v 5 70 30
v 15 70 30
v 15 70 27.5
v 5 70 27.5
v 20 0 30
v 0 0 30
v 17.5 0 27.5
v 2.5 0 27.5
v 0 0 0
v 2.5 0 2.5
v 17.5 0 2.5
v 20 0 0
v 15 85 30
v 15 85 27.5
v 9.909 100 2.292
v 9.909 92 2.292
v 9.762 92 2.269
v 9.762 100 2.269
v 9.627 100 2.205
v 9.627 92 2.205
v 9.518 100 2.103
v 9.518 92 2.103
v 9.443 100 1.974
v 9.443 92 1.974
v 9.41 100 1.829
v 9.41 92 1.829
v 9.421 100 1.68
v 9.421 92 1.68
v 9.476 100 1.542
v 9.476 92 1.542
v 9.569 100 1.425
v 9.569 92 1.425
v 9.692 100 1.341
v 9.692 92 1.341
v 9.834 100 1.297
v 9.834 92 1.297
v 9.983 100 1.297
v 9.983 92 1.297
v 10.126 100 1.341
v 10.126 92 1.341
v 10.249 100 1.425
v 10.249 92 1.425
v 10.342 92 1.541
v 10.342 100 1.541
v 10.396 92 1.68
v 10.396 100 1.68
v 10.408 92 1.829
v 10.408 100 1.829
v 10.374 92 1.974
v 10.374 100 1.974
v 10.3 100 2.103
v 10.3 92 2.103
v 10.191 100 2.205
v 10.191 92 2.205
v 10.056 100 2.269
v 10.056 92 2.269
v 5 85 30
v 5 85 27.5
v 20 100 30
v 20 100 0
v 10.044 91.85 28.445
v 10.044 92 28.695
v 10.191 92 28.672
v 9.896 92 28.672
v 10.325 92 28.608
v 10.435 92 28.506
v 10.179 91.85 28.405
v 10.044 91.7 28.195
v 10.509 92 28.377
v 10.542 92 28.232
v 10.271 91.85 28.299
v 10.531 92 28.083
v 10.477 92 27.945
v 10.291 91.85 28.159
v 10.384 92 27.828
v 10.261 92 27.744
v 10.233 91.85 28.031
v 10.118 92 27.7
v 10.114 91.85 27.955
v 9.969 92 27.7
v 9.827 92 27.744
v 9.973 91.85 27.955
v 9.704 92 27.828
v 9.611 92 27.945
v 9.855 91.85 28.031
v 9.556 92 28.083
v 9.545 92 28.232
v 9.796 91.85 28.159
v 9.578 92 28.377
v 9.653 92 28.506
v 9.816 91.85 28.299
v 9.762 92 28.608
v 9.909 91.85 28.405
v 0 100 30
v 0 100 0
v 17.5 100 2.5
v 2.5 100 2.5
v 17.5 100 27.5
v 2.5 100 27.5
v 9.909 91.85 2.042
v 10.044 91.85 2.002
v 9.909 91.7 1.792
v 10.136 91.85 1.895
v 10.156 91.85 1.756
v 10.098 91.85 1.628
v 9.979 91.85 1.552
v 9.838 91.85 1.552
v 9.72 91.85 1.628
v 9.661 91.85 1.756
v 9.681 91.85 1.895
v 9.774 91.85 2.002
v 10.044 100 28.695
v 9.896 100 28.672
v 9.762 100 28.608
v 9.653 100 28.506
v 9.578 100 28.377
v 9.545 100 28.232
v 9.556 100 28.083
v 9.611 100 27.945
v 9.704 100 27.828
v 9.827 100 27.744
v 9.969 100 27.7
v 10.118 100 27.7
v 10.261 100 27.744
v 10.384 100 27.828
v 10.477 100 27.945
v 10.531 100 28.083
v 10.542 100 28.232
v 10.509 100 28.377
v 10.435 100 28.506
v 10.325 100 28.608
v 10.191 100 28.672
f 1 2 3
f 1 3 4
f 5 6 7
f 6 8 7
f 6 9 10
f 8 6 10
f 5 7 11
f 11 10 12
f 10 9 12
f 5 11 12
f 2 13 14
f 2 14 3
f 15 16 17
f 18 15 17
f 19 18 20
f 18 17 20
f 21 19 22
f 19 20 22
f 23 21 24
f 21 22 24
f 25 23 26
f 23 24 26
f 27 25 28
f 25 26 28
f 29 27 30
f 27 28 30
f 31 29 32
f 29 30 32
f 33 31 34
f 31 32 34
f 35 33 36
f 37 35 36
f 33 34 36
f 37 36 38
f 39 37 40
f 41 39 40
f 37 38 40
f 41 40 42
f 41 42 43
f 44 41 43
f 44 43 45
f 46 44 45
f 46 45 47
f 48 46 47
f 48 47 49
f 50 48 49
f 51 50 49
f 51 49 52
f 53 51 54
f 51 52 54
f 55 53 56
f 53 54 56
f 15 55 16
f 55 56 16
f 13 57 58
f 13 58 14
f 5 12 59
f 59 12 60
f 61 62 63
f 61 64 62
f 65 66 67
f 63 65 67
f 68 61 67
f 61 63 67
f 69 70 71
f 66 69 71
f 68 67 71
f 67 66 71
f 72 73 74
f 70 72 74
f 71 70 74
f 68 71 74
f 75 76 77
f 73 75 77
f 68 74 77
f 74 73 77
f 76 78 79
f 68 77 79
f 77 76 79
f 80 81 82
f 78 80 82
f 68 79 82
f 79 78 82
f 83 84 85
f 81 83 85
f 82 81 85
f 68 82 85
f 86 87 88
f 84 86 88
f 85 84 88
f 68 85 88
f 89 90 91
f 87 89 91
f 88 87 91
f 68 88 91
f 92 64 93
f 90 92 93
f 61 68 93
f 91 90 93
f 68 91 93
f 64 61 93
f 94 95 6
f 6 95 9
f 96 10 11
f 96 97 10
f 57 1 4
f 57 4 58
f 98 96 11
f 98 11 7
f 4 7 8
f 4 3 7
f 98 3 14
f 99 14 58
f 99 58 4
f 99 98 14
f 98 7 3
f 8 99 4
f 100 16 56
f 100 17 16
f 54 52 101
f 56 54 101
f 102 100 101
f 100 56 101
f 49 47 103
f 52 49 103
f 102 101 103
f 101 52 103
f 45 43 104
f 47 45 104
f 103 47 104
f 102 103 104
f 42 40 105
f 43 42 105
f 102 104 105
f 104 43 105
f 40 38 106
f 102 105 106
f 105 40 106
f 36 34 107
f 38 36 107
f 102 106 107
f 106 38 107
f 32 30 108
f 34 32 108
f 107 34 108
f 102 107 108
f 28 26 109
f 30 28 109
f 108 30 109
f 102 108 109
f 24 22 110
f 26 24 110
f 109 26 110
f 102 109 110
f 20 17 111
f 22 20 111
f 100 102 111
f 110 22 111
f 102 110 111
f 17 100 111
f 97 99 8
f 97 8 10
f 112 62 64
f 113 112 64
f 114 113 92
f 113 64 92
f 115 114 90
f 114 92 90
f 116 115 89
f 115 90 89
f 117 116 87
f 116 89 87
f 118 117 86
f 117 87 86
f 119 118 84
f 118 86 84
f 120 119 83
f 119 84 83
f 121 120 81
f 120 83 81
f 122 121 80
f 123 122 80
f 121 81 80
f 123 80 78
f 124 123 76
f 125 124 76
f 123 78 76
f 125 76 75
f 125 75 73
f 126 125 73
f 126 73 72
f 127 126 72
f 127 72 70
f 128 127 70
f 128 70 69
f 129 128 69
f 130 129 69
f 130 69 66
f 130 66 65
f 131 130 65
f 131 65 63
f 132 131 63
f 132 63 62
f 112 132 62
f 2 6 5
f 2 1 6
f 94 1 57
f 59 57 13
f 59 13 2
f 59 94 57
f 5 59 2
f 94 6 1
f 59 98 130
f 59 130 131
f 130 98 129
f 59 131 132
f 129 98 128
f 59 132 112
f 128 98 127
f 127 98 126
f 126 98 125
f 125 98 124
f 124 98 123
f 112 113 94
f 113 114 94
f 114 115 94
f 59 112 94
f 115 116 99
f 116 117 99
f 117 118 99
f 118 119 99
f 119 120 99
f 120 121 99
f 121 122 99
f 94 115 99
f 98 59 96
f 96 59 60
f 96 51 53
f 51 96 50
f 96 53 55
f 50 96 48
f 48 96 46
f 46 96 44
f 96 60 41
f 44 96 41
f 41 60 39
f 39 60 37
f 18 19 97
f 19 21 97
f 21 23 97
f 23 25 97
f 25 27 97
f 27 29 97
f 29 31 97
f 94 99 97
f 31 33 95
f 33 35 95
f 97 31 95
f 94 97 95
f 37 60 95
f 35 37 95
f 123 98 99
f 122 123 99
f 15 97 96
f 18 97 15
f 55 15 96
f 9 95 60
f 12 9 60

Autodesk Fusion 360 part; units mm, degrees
sketch "Boceto1" plane through (0, 0, 0) normal (0, 0, 1) x (1, 0, 0)
  line L0 (0, 0) -> (20, 0)
  line L1 (20, 0) -> (20, 100)
  line L2 (20, 100) -> (0, 100)
  line L3 (0, 100) -> (0, 0)
  dimension "d1" = 20
  dimension "d2" = 100
sketch "Boceto2" plane through (0, 0, 0) normal (1, 0, 0) x (0, 1, 0)
  line L0 (0, 0) -> (100, 0)
  line L1 (100, 0) -> (100, 30)
  line L2 (100, 30) -> (0, 30)
  line L3 (0, 30) -> (0, 0)
  dimension "d3" = 100
  dimension "d4" = 30
sketch "Boceto3" plane through (0, 0, 0) normal (1, 0, 0) x (0, 1, 0)
sketch "Boceto4" plane through (0, 0, 0) normal (0, 1, 0) x (1, 0, 0)
  line L0 (0, 0) -> (20, 0)
  line L1 (20, 0) -> (20, -30)
  line L2 (20, -30) -> (0, -30)
  line L3 (0, -30) -> (0, 0)
  line L4 (0, -30) -> (0, 0)
  dimension "d5" = 20
  dimension "d6" = 30
sketch "Boceto5" plane through (0, 0, 0) normal (0, 0, 1) x (1, 0, 0)
extrude "Extruir1" add sketch "Boceto1" along normal blind 30
sketch "Boceto6" plane through (0, 100, 0) normal (0, 1, 0) x (-1, 0, 0)
  line L0 (-20, 0) -> (0, 0)
  line L1 (0, 0) -> (0, 30)
  line L2 (0, 30) -> (-20, 30)
  line L3 (-20, 30) -> (-20, 0)
  line L4 (-2.5, 2.5) -> (-17.5, 2.5)
  line L5 (-17.5, 2.5) -> (-17.5, 27.5)
  line L6 (-17.5, 27.5) -> (-2.5, 27.5)
  line L7 (-2.5, 27.5) -> (-2.5, 2.5)
  dimension "d9" = 25
  dimension "d10" = 15
extrude "Extruir2" cut sketch "Boceto6" against normal blind 20 contours L4 L5 L6 L7
hole "Agujero1" at (10.0437, 100, 28.1947) direction (0, -1, 0) diameter 1 depth 8 tip angle 118
hole "Agujero2" at (9.9089, 100, 1.7915) direction (0, -1, 0) diameter 1 depth 8 tip angle 118
extrude "Extruir3" cut 1 faces at (7.5, 80, 10.8333) along direction (0, -1, 0) blind 79
extrude "Extruir4" cut 1 faces at (7.5, 1, 10.8333) along direction (0, -1, 0) blind 105
sketch "Boceto7" plane through (20, 0, 0) normal (1, 0, 0) x (0, 1, 0)
  line L0 (0, 0) -> (100, 0)
  line L1 (100, 0) -> (100, 30)
  line L2 (100, 30) -> (0, 30)
  line L3 (0, 30) -> (0, 0)
sketch "Boceto8" plane through (0, 0, 30) normal (0, 0, 1) x (-1, 0, 0)
  line L0 (0, -100) -> (0, 0)
  line L1 (0, 0) -> (-20, 0)
  line L2 (-20, 0) -> (-20, -100)
  line L3 (-20, -100) -> (0, -100)
  line L4 (-20, -100) -> (-20, 0)
  line L5 (-15, -70) -> (-5, -70)
  line L6 (-5, -70) -> (-5, -80)
  line L7 (-5, -80) -> (-15, -80)
  line L8 (-15, -80) -> (-15, -70)
  line L9 (-5, -80) -> (-15, -80)
  line L10 (-15, -80) -> (-15, -70)
  line L11 (-15, -70) -> (-5, -70)
  line L12 (-5, -70) -> (-5, -80)
  dimension "d23" = 100
  dimension "d24" = 20
extrude "Extruir5" cut sketch "Boceto8" against normal blind 7 contours L5 L6 L7 L8 L9 L10 L11 L12
sketch "Boceto9" plane through (0, 0, 30) normal (0, 0, 1) x (-1, 0, 0)
  line L0 (-15, -80) -> (-15, -70)
  line L1 (-15, -70) -> (-5, -70)
  line L2 (-5, -70) -> (-5, -80)
  line L3 (-5, -80) -> (-15, -80)
  line L4 (0, -100) -> (0, 0)
  line L5 (0, 0) -> (-20, 0)
  line L6 (-20, 0) -> (-20, -100)
  line L7 (-20, -100) -> (0, -100)
  line L8 (-15, -80) -> (-5, -80)
  line L9 (-5, -80) -> (-5, -85)
  line L10 (-5, -85) -> (-15, -85)
  line L11 (-15, -85) -> (-15, -80)
extrude "Extruir6" cut sketch "Boceto9" against normal blind 4 contours L3 L8 L9 L10 L11
